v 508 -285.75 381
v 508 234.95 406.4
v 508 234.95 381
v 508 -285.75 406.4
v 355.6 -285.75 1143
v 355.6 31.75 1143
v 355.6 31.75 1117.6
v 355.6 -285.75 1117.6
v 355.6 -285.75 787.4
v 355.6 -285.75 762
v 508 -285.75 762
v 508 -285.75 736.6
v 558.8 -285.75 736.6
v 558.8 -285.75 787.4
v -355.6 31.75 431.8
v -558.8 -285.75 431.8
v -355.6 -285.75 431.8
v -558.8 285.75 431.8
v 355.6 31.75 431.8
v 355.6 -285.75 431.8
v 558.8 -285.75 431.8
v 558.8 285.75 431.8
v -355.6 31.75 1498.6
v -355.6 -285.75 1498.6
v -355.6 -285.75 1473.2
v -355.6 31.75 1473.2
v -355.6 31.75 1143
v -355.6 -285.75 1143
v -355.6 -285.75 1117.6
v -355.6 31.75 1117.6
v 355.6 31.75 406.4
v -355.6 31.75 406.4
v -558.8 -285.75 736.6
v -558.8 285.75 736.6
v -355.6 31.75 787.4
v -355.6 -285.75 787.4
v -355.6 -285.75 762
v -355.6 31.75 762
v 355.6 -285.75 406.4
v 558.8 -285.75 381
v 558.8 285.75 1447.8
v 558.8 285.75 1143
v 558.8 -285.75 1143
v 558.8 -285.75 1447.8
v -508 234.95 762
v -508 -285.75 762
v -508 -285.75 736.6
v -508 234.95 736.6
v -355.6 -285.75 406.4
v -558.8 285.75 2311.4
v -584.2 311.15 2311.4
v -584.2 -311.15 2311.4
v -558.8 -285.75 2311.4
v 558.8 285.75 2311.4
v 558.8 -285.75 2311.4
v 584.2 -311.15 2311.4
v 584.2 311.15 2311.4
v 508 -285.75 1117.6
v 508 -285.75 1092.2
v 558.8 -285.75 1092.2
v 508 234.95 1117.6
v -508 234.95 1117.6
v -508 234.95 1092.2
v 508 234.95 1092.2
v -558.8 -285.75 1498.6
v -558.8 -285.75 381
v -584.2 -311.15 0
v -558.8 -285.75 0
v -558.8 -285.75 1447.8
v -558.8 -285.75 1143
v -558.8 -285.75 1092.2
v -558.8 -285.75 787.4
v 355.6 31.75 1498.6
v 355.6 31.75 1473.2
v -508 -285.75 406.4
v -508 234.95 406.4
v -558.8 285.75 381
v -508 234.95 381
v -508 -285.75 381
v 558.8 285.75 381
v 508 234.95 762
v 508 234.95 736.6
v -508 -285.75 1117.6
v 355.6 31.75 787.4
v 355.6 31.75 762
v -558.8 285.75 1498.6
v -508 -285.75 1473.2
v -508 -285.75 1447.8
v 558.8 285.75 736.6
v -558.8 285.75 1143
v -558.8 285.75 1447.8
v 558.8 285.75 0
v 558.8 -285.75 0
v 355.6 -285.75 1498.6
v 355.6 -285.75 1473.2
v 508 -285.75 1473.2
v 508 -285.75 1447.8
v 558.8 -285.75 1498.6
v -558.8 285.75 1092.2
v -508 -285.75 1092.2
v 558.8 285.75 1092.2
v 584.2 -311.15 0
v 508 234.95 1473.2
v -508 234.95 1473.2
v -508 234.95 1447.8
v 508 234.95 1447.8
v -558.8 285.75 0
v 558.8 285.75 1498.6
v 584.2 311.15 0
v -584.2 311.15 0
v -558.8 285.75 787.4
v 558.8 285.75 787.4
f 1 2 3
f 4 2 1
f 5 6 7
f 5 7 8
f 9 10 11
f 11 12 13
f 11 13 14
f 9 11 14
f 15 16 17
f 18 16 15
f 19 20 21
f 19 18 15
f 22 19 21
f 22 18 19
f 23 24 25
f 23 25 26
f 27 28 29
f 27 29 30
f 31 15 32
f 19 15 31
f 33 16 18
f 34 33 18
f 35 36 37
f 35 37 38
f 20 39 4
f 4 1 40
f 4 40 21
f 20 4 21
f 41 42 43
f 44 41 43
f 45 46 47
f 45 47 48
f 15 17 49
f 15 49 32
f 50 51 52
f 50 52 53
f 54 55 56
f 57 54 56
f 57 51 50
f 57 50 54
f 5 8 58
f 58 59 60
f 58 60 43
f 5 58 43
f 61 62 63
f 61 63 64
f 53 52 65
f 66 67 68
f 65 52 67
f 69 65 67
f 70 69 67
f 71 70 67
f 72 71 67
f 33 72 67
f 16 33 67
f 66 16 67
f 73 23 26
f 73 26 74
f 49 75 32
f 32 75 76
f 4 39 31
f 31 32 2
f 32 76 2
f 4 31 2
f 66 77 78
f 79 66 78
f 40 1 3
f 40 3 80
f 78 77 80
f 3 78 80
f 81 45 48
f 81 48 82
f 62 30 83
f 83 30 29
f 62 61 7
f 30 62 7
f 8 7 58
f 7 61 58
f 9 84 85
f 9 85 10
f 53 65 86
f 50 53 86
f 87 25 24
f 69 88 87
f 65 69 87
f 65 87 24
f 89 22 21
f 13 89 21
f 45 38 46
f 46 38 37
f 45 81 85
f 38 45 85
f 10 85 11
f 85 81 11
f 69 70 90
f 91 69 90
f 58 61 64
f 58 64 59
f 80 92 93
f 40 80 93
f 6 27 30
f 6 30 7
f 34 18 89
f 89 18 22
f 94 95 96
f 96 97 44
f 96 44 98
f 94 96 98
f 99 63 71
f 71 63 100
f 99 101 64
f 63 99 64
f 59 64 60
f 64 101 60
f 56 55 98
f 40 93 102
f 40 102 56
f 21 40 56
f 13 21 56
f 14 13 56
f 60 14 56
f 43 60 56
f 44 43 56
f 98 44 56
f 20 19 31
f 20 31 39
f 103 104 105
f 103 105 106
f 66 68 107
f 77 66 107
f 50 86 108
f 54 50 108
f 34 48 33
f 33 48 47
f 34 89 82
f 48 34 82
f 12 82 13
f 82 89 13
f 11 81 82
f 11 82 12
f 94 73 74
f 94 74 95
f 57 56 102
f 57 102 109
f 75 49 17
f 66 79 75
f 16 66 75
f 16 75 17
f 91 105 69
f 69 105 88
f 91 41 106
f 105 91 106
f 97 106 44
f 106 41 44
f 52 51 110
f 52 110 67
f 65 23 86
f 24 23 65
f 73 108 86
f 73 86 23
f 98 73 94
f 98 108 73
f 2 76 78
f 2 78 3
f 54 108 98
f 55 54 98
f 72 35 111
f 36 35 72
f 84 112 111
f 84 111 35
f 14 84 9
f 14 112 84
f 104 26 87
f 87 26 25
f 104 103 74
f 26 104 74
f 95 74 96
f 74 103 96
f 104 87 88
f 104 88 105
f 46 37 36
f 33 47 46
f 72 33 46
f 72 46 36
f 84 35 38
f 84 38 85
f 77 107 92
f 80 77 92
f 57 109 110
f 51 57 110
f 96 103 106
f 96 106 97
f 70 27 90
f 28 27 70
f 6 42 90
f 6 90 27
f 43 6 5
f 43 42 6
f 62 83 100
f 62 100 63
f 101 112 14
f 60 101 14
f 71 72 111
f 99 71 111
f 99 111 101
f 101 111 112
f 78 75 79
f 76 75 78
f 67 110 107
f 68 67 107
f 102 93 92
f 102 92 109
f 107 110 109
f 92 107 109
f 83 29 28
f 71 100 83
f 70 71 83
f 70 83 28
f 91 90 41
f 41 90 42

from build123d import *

# Parameters (mm, degrees)
F1_DEPTH  = 2311.4
F3_DEPTH  = 2311.4
F4_DEPTH  = 2311.4
F2_W      = 1117.6
F2_H      = 25.4
F9_DEPTH  = 50.8
F7_W      = 571.5
F7_H      = 25.4
F10_DEPTH = 50.8
F8_W      = 571.5
F8_H      = 25.4
F11_DEPTH = 50.8
F12_W     = 571.5
F12_H     = 25.4
F13_DEPTH = 203.2
F14_W     = 571.5
F14_H     = 25.4
F15_DEPTH = 203.2
F16_W     = 711.2
F16_H     = 25.4
F17_DEPTH = 254


with BuildPart() as f1:
    # F0 (on Top) → F1 (new body)
    with BuildSketch(Plane.XY):
        Polygon((-558.8, 285.75), (558.8, 285.75), (584.2, 311.15), (-584.2, 311.15), align=None)
    extrude(amount=F1_DEPTH)

    # F0 (on Top) → F3 (join)
    with BuildSketch(Plane.XY):
        Polygon((-558.8, -285.75), (-558.8, 285.75), (-584.2, 311.15), (-584.2, -311.15), align=None)
    extrude(amount=F3_DEPTH)

    # F0 (on Top) → F4 (join)
    with BuildSketch(Plane.XY):
        Polygon((558.8, 285.75), (558.8, -285.75), (584.2, -311.15), (584.2, 311.15), align=None)
    extrude(amount=F4_DEPTH)

    # F2 (on face) → F9 (join)
    with BuildSketch(Plane.XZ.offset(-285.75)):
        with Locations((0, 393.7)):
            Rectangle(F2_W, F2_H)
        with Locations((0, 749.3)):
            Rectangle(F2_W, F2_H)
        with Locations((0, 1104.9)):
            Rectangle(F2_W, F2_H)
        with Locations((0, 1460.5)):
            Rectangle(F2_W, F2_H)
    extrude(amount=F9_DEPTH)

    # F7 (on face) → F10 (join)
    with BuildSketch(Plane.YZ.offset(-558.8)):
        with Locations((0, 1460.5)):
            Rectangle(F7_W, F7_H)
        with Locations((0, 1104.9)):
            Rectangle(F7_W, F7_H)
        with Locations((0, 749.3)):
            Rectangle(F7_W, F7_H)
        with Locations((0, 393.7)):
            Rectangle(F7_W, F7_H)
    extrude(amount=F10_DEPTH)

    # F8 (on face) → F11 (join)
    with BuildSketch(Plane(origin=(558.8, 0, 0), x_dir=(0, -1, 0), z_dir=(-1, 0, 0))):
        with Locations((0, 393.7)):
            Rectangle(F8_W, F8_H)
        with Locations((0, 749.3)):
            Rectangle(F8_W, F8_H)
        with Locations((0, 1104.9)):
            Rectangle(F8_W, F8_H)
        with Locations((0, 1460.5)):
            Rectangle(F8_W, F8_H)
    extrude(amount=F11_DEPTH)

    # F12 (on face) → F13 (join)
    with BuildSketch(Plane.YZ.offset(-558.8)):
        with Locations((0, 419.1)):
            Rectangle(F12_W, F12_H)
        with Locations((0, 774.7)):
            Rectangle(F12_W, F12_H)
        Polygon((234.95, 1117.6), (285.75, 1117.6), (285.75, 1143), (-285.75, 1143), (-285.75, 1117.6), align=None)
        with Locations((0, 1485.9)):
            Rectangle(F12_W, F12_H)
    extrude(amount=F13_DEPTH)

    # F14 (on face) → F15 (join)
    with BuildSketch(Plane(origin=(558.8, 0, 0), x_dir=(0, -1, 0), z_dir=(-1, 0, 0))):
        with Locations((0, 1485.9)):
            Rectangle(F14_W, F14_H)
        with Locations((0, 774.7)):
            Rectangle(F14_W, F14_H)
        with Locations((0, 419.1)):
            Rectangle(F14_W, F14_H)
        with Locations((0, 1130.3)):
            Rectangle(F14_W, F14_H)
    extrude(amount=F15_DEPTH)

    # F16 (on face) → F17 (join)
    with BuildSketch(Plane.XZ.offset(-285.75)):
        with Locations((0, 419.1)):
            Rectangle(F16_W, F16_H)
        with Locations((0, 1485.9)):
            Rectangle(F16_W, F16_H)
        with Locations((0, 774.7)):
            Rectangle(F16_W, F16_H)
        with Locations((0, 1130.3)):
            Rectangle(F16_W, F16_H)
    extrude(amount=F17_DEPTH)


solid = f1.part
